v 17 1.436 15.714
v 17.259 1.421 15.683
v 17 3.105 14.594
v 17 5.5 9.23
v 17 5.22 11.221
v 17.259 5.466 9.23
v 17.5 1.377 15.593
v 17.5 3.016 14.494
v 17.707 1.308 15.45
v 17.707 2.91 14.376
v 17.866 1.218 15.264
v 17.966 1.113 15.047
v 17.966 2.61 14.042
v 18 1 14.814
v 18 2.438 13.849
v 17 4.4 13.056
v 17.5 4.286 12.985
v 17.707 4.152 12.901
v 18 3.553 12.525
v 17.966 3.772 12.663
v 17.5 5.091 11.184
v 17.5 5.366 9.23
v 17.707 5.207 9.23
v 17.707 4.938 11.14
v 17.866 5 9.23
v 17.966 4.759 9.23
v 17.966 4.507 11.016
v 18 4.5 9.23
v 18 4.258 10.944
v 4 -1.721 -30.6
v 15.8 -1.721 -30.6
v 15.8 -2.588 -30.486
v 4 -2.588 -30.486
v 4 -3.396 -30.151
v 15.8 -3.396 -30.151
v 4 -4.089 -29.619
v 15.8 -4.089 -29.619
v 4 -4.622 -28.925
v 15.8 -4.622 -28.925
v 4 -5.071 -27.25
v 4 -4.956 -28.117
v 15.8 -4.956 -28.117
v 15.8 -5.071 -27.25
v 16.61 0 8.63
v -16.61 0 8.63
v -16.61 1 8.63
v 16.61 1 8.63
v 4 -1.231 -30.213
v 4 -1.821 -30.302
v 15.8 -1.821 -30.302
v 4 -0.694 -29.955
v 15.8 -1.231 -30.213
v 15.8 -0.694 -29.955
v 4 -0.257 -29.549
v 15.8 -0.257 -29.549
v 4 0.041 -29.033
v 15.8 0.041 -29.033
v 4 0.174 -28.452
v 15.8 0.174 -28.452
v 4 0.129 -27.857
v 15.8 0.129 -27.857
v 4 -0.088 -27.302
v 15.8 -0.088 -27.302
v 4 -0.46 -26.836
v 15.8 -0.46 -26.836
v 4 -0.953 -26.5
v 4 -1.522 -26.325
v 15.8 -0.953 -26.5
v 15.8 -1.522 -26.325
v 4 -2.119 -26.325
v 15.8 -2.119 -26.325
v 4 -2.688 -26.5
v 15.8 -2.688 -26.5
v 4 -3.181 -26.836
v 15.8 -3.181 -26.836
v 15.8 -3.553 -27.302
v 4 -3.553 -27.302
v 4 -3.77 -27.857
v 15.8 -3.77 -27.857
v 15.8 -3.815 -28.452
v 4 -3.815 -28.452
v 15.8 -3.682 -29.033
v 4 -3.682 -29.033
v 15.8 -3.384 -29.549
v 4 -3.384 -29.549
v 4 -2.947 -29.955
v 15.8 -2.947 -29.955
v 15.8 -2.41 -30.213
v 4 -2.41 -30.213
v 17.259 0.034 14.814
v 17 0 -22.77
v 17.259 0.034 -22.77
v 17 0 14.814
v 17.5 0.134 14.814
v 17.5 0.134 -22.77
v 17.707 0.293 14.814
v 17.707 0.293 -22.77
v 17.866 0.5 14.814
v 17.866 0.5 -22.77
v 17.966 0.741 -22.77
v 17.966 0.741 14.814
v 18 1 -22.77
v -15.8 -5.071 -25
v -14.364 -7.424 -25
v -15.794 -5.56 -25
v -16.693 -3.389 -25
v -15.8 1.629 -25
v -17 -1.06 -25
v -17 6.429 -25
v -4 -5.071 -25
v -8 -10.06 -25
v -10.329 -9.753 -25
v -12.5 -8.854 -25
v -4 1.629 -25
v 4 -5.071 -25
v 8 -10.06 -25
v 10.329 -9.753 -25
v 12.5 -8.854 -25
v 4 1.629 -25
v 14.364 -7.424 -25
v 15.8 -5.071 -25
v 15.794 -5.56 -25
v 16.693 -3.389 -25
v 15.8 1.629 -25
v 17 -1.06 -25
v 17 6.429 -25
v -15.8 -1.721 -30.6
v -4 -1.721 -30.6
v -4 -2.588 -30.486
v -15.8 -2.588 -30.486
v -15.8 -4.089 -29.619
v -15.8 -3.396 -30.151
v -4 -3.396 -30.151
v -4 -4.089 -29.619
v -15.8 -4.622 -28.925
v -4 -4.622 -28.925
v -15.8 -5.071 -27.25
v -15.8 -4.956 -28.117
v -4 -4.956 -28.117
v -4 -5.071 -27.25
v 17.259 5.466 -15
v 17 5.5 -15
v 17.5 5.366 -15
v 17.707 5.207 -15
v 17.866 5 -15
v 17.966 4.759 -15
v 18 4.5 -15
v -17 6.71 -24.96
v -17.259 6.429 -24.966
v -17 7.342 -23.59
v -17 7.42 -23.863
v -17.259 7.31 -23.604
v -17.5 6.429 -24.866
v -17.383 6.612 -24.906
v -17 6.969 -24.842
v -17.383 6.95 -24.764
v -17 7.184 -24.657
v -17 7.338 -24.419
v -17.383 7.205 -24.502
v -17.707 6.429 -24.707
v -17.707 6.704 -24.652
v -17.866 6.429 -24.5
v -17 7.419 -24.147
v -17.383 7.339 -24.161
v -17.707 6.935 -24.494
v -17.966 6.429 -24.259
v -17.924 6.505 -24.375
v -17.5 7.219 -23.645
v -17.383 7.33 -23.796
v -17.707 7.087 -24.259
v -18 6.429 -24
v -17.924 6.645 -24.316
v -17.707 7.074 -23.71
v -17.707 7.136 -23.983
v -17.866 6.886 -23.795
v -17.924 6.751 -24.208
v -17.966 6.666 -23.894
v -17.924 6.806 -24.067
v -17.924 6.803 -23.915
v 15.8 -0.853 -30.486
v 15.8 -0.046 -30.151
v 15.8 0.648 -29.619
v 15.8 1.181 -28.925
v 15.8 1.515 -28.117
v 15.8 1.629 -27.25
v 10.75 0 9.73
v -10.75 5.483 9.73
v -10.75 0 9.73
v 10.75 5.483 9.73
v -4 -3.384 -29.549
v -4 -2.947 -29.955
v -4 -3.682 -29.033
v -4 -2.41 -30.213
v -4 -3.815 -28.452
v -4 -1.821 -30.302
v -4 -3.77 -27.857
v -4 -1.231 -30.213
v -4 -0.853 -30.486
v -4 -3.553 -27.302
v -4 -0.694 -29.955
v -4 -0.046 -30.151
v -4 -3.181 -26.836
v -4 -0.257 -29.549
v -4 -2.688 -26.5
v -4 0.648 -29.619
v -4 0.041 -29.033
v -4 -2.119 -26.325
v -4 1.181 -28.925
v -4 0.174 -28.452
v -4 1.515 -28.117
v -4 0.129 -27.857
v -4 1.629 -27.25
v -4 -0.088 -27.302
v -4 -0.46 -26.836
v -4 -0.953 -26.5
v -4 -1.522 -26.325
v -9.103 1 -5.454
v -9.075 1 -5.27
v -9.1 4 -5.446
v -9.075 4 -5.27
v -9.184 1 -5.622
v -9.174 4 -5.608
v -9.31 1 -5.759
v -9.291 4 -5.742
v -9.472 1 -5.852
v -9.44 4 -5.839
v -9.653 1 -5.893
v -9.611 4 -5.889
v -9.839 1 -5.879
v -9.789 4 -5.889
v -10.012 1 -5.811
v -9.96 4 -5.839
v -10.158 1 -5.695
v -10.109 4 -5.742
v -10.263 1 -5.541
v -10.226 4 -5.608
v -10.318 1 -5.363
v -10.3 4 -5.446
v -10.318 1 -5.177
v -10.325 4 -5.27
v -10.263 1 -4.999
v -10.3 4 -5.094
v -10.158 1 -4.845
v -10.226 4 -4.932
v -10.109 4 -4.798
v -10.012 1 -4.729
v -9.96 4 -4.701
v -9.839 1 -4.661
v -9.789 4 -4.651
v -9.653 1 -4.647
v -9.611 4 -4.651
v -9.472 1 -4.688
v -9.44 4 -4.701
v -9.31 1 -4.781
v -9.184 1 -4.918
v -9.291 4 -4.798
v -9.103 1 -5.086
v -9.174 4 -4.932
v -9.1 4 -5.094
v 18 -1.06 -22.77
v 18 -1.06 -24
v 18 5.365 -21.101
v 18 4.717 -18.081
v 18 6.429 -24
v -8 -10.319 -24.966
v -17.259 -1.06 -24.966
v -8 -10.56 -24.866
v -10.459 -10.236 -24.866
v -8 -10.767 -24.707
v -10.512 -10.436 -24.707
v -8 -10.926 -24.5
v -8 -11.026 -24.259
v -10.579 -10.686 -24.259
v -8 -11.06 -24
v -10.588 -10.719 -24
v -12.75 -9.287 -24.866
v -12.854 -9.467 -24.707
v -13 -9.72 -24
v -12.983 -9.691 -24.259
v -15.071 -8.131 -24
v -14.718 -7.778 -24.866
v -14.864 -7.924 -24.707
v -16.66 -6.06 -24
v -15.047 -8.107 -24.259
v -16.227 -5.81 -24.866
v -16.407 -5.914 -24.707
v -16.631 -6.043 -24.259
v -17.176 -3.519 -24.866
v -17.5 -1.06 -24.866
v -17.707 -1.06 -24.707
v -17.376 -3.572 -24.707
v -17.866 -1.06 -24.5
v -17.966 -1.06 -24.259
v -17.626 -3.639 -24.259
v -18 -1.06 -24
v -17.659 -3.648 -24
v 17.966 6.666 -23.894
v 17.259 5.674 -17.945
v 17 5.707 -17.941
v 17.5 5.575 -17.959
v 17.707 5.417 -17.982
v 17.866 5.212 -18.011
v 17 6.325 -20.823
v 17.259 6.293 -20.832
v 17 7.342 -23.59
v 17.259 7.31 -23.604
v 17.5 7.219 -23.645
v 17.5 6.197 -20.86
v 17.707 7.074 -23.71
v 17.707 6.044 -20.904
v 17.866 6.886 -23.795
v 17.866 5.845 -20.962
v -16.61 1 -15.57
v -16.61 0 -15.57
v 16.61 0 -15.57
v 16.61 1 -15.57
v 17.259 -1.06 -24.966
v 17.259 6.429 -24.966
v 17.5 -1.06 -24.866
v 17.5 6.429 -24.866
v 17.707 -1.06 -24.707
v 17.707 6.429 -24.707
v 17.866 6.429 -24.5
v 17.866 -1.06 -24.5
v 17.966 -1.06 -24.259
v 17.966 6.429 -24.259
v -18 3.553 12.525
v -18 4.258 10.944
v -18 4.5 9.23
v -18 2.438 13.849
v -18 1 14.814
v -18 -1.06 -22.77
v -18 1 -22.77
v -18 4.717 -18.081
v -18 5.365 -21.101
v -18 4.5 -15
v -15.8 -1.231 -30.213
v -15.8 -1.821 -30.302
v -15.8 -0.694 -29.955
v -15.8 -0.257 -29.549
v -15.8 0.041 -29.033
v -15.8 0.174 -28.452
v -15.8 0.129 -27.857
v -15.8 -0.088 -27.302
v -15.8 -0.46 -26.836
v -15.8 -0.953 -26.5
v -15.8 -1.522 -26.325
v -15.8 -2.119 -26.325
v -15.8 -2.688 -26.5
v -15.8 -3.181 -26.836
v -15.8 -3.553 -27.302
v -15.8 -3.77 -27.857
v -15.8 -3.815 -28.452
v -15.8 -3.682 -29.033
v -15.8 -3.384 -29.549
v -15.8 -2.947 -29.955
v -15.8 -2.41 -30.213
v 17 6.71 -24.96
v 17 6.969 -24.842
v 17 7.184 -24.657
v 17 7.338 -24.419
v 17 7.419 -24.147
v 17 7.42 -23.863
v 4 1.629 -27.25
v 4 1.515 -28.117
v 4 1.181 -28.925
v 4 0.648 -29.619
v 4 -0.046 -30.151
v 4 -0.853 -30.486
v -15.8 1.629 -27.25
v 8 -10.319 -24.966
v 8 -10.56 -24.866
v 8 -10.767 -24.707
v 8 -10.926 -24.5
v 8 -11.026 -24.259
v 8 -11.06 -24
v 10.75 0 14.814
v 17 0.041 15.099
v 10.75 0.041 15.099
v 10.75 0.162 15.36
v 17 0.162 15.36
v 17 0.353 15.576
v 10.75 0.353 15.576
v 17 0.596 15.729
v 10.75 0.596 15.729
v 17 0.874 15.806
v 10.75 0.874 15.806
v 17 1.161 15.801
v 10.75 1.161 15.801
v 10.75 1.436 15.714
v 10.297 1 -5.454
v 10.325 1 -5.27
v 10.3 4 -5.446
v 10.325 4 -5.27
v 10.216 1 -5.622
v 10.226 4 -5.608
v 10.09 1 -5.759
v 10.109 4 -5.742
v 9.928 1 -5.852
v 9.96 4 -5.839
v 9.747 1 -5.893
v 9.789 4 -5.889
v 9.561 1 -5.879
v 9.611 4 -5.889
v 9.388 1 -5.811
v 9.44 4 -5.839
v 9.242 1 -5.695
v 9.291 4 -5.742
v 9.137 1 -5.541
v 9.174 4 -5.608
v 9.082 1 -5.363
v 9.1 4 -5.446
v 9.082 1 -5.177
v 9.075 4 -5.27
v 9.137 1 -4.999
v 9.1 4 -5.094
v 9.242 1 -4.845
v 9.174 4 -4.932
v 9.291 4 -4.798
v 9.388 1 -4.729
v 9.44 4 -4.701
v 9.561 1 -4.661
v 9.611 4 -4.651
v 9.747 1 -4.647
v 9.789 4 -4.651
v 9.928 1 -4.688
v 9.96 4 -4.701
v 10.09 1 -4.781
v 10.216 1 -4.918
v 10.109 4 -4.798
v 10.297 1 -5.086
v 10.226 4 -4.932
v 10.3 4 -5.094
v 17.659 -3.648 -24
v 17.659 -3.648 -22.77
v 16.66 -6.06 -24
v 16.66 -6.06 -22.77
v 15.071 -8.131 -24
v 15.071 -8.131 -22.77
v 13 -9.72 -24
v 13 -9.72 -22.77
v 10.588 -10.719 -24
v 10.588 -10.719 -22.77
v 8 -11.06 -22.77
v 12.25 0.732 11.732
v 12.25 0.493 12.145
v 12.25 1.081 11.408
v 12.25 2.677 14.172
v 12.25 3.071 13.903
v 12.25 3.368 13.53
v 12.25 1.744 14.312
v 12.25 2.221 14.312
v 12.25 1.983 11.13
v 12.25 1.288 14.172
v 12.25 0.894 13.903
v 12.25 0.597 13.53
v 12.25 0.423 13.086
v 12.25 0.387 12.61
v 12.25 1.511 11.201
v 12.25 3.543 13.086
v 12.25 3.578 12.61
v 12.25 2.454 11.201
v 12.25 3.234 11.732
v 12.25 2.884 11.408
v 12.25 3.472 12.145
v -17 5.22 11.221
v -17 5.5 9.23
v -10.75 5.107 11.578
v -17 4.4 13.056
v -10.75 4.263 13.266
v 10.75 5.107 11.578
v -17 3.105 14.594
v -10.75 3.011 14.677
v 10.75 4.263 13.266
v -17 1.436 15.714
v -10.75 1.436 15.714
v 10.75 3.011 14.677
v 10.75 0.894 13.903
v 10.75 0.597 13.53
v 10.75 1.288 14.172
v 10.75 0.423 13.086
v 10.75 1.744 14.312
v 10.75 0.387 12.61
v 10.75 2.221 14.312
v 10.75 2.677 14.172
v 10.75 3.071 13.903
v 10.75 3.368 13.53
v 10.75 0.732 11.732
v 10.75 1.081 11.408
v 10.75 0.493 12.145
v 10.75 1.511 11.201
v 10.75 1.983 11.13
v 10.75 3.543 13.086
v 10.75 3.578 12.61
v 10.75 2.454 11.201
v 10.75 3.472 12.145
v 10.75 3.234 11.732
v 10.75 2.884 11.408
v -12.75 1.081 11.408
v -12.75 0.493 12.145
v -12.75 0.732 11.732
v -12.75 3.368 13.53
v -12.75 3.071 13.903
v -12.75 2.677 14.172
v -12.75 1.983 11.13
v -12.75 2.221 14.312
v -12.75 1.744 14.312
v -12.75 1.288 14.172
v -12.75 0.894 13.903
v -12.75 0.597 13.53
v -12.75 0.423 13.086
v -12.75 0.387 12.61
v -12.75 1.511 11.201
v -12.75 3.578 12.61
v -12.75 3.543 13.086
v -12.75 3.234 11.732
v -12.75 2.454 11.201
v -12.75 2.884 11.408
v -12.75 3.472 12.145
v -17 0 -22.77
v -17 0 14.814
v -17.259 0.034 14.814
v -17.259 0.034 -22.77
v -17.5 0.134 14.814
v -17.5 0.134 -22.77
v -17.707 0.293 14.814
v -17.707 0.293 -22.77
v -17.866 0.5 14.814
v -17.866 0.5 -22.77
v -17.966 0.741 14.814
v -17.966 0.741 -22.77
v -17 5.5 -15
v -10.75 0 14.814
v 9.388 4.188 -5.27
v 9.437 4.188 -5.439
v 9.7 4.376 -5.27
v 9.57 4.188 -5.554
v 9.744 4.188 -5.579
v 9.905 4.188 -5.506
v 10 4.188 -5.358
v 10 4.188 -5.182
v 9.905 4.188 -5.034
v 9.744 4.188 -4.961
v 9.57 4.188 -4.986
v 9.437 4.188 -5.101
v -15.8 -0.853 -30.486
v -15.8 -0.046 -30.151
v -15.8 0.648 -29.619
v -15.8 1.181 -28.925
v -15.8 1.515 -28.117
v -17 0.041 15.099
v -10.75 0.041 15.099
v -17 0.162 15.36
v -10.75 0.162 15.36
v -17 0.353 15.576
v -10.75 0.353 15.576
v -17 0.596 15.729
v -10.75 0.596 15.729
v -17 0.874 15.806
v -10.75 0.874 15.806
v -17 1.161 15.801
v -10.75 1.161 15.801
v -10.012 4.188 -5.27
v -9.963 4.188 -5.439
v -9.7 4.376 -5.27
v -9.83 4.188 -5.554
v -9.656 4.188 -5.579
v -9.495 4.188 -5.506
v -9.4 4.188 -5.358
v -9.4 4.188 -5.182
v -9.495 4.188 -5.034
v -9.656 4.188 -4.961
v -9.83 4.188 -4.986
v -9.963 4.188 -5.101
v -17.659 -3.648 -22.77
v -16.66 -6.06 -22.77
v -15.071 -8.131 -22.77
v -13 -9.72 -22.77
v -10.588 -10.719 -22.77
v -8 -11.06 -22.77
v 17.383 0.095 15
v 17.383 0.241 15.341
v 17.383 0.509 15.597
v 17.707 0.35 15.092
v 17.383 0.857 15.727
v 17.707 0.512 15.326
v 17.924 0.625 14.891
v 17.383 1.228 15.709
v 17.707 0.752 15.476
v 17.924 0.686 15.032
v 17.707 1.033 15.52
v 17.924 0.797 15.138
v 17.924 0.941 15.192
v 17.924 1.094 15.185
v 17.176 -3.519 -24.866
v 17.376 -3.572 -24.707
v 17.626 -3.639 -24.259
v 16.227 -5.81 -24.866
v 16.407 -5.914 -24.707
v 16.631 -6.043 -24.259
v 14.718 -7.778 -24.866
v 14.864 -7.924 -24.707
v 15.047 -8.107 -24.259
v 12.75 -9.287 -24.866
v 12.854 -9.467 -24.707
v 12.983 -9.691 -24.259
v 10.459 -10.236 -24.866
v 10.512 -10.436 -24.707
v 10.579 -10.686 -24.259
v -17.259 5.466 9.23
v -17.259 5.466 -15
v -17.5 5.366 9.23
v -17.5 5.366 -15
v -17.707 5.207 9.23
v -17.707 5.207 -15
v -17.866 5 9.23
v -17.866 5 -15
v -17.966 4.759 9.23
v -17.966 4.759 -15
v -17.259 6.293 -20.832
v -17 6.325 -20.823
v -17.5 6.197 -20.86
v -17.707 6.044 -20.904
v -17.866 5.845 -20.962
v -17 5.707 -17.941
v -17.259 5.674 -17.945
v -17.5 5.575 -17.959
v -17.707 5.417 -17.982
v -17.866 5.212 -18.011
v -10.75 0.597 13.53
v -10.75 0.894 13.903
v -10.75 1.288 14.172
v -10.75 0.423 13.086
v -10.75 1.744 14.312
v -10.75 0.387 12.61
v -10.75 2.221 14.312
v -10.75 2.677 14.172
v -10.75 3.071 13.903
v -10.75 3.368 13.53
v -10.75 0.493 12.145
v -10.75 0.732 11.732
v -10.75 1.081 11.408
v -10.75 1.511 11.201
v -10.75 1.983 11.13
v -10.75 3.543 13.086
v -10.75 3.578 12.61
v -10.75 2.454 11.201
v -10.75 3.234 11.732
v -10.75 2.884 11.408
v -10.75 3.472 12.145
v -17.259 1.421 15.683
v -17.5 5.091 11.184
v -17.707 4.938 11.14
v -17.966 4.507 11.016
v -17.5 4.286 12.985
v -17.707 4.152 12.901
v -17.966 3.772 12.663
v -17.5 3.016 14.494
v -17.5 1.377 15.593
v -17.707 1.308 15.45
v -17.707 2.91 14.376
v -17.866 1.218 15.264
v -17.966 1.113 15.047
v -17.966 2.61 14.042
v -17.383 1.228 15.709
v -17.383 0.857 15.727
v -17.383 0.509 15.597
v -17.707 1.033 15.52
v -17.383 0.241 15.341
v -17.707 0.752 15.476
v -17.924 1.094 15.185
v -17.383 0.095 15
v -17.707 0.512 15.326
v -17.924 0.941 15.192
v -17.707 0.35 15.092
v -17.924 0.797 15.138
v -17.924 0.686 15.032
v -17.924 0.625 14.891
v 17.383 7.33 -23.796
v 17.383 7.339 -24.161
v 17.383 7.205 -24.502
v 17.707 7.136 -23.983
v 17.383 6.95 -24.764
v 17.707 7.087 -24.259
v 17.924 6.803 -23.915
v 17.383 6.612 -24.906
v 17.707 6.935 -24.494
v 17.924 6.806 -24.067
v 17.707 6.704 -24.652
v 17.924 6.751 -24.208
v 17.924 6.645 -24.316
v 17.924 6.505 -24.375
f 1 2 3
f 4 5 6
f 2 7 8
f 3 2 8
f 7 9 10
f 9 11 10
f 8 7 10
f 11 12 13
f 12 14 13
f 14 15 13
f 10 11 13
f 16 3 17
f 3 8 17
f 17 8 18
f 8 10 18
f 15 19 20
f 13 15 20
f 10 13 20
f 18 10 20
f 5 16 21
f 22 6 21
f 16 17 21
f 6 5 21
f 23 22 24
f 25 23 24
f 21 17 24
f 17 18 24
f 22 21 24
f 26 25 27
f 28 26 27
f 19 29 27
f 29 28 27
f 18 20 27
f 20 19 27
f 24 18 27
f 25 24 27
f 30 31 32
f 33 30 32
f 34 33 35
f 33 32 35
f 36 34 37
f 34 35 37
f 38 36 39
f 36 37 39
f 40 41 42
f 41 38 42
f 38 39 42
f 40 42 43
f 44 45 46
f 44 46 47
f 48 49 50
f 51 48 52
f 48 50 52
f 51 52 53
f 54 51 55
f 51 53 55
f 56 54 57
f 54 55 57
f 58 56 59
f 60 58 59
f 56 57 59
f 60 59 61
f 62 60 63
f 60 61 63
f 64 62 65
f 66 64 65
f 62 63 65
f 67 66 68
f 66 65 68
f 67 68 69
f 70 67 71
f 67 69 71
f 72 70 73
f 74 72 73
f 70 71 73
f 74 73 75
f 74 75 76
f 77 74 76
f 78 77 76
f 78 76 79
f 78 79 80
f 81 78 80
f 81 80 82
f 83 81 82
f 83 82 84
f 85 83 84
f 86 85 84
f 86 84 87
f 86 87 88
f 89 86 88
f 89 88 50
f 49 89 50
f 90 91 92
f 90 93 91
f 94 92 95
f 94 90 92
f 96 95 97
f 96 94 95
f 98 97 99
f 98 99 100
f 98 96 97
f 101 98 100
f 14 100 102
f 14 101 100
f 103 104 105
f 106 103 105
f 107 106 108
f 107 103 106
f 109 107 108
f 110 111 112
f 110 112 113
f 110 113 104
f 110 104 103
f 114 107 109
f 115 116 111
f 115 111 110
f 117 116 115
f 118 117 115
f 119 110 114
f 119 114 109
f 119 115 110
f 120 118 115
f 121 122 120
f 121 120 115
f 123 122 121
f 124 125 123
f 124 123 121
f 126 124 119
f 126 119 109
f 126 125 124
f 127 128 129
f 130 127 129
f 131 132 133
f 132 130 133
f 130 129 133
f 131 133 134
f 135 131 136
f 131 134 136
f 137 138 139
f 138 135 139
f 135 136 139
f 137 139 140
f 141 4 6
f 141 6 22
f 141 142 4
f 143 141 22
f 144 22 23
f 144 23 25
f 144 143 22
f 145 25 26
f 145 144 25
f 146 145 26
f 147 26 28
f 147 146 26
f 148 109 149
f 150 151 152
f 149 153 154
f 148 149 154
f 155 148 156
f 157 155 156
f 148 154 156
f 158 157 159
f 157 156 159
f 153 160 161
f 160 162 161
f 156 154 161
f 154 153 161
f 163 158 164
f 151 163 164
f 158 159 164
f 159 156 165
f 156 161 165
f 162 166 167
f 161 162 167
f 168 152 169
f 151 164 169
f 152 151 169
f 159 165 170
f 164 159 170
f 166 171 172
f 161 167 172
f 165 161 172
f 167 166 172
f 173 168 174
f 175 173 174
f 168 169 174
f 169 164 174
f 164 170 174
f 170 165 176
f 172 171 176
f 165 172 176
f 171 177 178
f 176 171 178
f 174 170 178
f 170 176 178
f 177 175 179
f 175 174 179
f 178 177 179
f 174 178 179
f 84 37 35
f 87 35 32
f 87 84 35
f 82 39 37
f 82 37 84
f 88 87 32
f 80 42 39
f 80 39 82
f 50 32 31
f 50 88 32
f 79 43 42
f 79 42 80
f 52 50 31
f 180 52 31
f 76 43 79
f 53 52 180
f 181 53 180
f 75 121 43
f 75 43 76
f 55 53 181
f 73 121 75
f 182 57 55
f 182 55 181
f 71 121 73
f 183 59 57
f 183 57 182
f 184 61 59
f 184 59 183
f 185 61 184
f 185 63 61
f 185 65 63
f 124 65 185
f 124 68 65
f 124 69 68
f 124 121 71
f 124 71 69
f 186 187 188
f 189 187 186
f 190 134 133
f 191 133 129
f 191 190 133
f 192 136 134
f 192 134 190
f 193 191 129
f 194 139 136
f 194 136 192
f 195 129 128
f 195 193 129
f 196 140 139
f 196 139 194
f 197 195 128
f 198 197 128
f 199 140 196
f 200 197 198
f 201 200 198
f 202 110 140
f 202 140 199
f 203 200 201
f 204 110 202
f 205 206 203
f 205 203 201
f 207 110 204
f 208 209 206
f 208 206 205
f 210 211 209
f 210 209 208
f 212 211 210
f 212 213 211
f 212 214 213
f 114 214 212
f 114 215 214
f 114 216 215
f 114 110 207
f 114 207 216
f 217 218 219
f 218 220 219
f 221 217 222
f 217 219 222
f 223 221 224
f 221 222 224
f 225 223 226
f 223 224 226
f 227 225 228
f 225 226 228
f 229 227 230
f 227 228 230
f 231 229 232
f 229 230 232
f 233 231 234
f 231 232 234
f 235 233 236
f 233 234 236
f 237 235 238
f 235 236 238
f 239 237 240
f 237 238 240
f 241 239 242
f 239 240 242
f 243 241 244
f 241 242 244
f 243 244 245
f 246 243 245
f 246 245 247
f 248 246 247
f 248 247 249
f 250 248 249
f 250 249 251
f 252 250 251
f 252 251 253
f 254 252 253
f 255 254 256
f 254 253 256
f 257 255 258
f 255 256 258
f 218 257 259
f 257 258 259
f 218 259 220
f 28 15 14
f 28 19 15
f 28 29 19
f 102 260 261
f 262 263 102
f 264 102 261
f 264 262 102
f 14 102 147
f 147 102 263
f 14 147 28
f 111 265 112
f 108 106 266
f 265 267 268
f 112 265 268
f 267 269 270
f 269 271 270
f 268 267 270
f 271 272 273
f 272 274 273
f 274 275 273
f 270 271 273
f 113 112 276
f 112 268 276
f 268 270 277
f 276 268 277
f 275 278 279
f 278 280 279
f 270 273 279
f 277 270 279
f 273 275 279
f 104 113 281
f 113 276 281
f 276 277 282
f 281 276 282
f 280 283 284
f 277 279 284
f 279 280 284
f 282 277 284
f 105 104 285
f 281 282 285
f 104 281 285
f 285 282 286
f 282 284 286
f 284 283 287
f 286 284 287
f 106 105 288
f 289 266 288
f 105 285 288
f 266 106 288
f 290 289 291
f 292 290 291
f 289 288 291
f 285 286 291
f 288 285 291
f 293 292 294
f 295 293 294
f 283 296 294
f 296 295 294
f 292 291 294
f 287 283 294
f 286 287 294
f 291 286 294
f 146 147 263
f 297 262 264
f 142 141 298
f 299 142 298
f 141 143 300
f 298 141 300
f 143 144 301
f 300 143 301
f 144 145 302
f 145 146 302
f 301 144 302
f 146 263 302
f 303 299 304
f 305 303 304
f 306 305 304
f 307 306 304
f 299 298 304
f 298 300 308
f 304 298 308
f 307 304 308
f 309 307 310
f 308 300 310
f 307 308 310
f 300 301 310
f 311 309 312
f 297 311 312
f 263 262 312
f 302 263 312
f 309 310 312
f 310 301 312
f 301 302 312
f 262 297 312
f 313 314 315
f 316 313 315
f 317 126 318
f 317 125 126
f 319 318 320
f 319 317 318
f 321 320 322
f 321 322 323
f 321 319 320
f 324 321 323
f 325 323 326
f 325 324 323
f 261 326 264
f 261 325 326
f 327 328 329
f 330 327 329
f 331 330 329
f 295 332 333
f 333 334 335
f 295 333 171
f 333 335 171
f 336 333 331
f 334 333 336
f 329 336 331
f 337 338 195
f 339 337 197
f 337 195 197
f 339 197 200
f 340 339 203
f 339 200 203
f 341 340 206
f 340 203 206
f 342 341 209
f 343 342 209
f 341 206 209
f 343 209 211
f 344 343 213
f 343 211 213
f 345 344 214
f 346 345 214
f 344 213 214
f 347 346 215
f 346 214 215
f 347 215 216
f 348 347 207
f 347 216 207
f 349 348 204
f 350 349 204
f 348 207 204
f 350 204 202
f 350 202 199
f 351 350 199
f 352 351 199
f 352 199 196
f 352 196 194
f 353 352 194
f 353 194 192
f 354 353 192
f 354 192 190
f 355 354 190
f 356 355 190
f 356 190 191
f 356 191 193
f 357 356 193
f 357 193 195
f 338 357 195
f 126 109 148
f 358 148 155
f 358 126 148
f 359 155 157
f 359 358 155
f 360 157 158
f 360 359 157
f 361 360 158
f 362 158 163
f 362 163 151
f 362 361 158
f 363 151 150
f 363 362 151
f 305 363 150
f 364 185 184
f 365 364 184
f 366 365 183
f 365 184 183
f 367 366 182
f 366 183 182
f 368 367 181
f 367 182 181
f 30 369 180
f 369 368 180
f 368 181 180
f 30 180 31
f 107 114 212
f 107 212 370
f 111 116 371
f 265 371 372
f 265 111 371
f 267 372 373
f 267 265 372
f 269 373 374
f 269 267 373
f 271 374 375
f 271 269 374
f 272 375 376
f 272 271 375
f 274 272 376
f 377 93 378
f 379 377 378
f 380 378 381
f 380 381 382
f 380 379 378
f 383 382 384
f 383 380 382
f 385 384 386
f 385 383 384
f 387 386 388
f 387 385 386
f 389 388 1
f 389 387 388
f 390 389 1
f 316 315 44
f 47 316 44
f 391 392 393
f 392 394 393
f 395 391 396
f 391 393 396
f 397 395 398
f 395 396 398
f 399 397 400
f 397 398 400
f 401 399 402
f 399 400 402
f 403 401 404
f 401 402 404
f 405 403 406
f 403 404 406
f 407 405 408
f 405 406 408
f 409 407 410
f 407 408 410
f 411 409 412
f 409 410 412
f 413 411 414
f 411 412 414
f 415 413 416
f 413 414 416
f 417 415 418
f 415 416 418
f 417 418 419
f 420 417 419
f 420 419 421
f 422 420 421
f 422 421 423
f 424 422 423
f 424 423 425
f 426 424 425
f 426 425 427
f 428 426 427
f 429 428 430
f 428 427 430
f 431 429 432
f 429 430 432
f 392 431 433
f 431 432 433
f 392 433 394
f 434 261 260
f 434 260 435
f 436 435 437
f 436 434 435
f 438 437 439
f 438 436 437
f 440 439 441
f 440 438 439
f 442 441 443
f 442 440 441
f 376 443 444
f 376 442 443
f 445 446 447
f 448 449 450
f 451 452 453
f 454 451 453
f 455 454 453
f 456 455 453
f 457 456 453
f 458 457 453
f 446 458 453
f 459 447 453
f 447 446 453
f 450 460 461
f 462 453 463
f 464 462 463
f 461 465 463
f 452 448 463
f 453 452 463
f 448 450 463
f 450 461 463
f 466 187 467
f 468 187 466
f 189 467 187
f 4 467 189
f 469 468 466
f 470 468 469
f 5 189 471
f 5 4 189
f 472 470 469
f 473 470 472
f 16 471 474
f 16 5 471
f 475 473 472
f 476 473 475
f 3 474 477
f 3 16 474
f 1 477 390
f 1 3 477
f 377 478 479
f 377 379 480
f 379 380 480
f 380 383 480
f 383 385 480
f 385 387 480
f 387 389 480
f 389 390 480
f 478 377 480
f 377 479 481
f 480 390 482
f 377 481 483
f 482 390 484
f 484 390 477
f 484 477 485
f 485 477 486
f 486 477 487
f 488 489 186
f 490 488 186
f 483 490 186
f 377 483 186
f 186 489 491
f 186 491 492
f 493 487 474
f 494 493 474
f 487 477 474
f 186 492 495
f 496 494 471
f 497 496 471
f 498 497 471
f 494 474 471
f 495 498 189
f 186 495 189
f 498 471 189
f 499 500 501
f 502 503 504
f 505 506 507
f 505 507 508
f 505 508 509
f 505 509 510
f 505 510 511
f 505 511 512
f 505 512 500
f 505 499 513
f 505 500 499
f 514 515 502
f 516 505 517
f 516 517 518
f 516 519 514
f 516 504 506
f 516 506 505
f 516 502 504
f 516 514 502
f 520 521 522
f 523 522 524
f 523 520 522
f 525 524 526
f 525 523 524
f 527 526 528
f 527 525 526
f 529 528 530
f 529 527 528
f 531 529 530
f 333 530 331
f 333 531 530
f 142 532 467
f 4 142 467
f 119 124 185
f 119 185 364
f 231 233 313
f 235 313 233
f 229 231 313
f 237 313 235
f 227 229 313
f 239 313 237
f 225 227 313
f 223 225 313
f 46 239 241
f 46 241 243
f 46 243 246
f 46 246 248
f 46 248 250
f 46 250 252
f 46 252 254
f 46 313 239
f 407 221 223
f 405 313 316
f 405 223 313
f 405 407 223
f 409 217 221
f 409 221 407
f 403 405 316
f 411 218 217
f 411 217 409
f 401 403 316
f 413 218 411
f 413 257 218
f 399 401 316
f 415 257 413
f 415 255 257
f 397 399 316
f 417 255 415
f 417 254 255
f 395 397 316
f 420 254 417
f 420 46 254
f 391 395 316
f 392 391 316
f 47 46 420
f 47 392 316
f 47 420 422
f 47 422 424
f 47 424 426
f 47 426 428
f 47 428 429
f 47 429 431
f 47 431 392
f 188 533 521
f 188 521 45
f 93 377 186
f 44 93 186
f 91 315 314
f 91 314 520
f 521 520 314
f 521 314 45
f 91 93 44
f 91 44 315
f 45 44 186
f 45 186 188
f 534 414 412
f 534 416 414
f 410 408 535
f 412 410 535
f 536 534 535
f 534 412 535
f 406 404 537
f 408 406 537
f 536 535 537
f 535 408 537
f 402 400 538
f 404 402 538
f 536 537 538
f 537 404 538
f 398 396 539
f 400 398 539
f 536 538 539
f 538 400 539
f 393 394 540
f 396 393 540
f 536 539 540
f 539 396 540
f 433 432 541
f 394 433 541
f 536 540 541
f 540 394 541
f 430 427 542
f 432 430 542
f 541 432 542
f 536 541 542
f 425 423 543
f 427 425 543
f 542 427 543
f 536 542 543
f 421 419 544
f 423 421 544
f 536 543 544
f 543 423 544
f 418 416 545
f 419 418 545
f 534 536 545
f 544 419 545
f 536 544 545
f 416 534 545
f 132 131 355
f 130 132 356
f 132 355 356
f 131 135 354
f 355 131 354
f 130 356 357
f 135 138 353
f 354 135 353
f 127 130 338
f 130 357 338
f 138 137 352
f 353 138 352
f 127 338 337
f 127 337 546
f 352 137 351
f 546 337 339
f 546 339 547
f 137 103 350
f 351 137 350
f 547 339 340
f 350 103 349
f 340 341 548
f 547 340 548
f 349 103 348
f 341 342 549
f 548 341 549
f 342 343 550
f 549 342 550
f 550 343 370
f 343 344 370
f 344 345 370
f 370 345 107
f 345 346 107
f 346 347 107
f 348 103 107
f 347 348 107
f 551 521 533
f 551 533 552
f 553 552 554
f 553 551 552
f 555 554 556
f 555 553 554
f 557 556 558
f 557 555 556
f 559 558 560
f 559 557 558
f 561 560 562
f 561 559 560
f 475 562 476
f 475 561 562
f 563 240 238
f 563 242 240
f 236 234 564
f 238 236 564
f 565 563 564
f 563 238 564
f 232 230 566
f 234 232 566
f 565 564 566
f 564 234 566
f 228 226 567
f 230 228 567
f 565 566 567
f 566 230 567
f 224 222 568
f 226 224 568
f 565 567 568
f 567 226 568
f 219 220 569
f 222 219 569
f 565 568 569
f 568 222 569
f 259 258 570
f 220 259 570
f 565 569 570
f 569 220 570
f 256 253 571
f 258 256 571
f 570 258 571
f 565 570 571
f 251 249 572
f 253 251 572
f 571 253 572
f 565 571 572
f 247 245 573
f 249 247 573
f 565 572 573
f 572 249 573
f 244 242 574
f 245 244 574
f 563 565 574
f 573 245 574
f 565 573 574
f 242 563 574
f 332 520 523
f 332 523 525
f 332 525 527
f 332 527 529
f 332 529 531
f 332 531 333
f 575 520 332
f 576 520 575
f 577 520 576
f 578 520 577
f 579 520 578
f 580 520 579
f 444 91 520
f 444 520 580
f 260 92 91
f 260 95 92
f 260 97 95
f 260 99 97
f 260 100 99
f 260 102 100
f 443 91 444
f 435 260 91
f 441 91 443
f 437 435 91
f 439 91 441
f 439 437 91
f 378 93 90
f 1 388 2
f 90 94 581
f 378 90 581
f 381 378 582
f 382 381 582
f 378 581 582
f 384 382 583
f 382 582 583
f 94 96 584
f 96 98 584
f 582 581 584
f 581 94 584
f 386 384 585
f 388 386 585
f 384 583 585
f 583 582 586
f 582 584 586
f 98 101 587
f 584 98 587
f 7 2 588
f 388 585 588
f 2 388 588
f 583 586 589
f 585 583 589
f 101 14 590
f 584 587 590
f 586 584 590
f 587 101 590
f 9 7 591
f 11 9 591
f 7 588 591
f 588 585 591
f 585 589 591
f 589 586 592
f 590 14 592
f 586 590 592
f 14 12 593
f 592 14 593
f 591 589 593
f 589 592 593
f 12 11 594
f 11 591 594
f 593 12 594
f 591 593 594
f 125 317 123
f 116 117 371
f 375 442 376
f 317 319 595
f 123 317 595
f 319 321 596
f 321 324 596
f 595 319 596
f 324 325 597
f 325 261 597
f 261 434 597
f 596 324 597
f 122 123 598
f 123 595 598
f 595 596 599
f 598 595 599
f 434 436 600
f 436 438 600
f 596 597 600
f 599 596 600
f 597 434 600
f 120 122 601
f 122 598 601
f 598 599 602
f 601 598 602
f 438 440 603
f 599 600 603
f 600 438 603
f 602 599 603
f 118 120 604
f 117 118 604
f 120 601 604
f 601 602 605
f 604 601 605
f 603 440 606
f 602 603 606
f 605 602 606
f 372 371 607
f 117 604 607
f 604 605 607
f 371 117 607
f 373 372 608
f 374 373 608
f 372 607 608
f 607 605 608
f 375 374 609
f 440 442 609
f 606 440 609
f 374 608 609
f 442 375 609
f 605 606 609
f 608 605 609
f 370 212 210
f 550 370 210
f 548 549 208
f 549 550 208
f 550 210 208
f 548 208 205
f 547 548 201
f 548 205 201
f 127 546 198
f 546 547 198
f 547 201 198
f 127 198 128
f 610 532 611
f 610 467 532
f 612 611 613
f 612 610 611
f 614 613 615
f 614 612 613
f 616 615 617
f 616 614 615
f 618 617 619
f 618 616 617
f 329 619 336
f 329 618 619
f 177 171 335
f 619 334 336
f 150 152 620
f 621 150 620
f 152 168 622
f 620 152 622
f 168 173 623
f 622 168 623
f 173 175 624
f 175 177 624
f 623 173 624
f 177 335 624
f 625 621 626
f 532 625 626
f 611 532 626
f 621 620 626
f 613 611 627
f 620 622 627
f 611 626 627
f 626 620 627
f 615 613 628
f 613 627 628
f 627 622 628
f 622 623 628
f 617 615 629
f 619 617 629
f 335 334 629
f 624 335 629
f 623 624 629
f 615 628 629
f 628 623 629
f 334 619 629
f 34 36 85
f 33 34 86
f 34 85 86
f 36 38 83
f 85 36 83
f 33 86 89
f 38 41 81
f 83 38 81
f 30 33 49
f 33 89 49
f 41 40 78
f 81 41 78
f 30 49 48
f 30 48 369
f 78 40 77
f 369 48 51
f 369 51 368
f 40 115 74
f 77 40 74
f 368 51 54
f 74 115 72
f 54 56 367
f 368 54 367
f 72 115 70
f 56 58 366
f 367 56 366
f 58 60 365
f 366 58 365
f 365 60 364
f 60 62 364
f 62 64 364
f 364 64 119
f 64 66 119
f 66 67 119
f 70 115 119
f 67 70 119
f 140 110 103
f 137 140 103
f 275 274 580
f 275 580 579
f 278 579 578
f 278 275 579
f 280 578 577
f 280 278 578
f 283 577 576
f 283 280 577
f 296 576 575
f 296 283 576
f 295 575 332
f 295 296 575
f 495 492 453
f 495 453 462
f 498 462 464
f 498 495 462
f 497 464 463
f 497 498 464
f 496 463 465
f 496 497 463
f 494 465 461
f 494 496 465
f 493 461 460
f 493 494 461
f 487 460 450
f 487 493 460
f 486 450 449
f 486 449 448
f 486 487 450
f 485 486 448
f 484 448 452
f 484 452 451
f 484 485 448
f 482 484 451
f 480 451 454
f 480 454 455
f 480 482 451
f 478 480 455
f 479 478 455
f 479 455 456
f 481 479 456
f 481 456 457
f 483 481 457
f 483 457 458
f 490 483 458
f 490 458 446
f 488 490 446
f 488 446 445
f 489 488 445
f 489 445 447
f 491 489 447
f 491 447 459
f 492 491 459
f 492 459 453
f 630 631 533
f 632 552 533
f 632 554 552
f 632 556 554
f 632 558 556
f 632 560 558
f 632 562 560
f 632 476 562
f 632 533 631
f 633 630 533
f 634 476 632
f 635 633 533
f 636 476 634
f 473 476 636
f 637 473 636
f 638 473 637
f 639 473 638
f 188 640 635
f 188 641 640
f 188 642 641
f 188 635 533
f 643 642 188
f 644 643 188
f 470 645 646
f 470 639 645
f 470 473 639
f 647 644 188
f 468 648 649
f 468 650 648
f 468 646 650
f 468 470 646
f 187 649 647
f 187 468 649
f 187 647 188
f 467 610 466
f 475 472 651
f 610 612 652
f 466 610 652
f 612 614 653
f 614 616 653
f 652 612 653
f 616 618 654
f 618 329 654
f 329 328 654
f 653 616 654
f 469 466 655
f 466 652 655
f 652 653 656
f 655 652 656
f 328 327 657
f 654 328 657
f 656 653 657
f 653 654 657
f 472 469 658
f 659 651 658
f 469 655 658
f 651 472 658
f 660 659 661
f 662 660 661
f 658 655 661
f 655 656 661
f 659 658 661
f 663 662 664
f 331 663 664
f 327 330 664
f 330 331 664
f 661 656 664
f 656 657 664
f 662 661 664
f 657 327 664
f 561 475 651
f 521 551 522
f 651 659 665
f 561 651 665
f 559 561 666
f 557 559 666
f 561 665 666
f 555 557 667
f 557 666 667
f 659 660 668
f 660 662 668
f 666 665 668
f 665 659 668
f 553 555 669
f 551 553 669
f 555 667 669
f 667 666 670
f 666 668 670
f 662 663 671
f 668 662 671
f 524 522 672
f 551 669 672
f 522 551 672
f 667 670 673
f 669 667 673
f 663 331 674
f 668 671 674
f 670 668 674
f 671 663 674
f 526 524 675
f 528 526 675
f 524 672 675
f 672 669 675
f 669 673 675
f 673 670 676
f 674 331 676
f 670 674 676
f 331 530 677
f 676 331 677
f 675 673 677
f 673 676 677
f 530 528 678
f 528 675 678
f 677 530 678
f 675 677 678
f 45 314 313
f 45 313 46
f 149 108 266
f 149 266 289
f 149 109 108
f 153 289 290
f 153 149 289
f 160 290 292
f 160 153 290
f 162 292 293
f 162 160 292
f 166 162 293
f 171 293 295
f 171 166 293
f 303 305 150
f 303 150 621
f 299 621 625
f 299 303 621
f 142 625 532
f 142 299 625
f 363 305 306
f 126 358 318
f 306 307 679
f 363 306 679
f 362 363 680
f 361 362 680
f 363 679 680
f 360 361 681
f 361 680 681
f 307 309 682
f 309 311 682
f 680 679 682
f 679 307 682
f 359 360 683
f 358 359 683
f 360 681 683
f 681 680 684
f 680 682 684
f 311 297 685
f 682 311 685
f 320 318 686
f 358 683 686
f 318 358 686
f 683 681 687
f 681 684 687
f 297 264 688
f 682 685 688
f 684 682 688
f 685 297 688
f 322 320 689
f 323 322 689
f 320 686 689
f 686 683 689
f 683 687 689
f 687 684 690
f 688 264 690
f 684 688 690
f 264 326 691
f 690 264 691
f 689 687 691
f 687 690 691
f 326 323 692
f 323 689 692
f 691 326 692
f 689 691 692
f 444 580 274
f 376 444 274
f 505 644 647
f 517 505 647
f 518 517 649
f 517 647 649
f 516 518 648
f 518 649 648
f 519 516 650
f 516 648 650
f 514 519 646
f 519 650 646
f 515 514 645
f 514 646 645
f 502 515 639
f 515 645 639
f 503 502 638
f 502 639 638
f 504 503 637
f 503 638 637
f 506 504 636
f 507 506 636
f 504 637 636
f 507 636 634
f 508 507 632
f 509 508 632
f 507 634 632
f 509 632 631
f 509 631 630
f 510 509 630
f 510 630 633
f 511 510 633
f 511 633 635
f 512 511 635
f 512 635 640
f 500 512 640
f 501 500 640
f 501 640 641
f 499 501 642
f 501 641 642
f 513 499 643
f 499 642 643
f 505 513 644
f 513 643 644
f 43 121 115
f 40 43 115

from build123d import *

# Parameters (mm, degrees)
BOSS_EXTRUDE1_DEPTH     = 18
SKETCH2_W               = 21.5
SKETCH2_H               = 6.5
CUT_EXTRUDE1_DEPTH      = 36
FILLET1_R               = 1
FILLET2_R               = 10
SKETCH3_R               = 1.6
CUT_EXTRUDE2_DEPTH      = 23
CUT_EXTRUDE2_DEPTH_BACK = 2
SKETCH4_W               = 11.8
SKETCH4_H               = 6.7
BOSS_EXTRUDE2_DEPTH     = 5.6
CUT_EXTRUDE3_DEPTH      = 34.8
SKETCH6_R               = 2
CUT_EXTRUDE4_DEPTH      = 34.8
SKETCH7_W               = 33.22
SKETCH7_H               = 24.2
CUT_EXTRUDE5_DEPTH      = 1
M1_6_TAPPED_HOLE1_D     = 1.25
M1_6_TAPPED_HOLE1_DEPTH = 3
M1_6_TAPPED_HOLE1_TIP   = 0.375537887
FILLET3_R               = 1
FILLET4_R               = 1


with BuildPart() as part:
    # Sketch1 → Boss-Extrude1 (new body, symmetric)
    with BuildSketch(Plane(origin=(0, 0, 0), x_dir=(0, 0, -1), z_dir=(1, 0, 0))):
        with BuildLine():
            Line((-16.23, 0), (22.77, 0))
            Line((22.77, 0), (22.77, -11.06))
            Line((22.77, -11.06), (25, -11.06))
            Line((25, -11.06), (25, 8.04))
            ThreePointArc((25, 8.04), (20.158769233, 6.144924279), (15, 5.5))
            Line((15, 5.5), (-9.23, 5.5))
            ThreePointArc((-9.23, 5.5), (-13.681123454, 3.960520759), (-16.23, 0))
        make_face()
    extrude(amount=BOSS_EXTRUDE1_DEPTH, both=True)

    # Sketch2 → Cut-Extrude1 (cut)
    with BuildSketch(Plane(origin=(0, 5.5, 0), x_dir=(1, 0, 0), z_dir=(0, 1, 0))):
        with Locations((0, -12.98)):
            Rectangle(SKETCH2_W, SKETCH2_H)
    extrude(amount=-CUT_EXTRUDE1_DEPTH, mode=Mode.SUBTRACT)

    # Fillet1
    fillet1_edges = [part.edges().sort_by_distance(p)[0] for p in [
        (0, 8.04, -25),
    ]]
    fillet(fillet1_edges, radius=FILLET1_R)

    # Fillet2
    fillet2_edges = [part.edges().sort_by_distance(p)[0] for p in [
        (18, -11.06, -23.885),
        (-18, -11.06, -23.885),
    ]]
    fillet(fillet2_edges, radius=FILLET2_R)

    # Sketch3 → Cut-Extrude2 (cut, two sides)
    with BuildSketch(Plane(origin=(-10.75, 0, 0), x_dir=(0, 0, -1), z_dir=(1, 0, 0))) as cut_extrude2_sk:
        with Locations((-12.73, 1.9826289)):
            Circle(SKETCH3_R)
    extrude(amount=CUT_EXTRUDE2_DEPTH, mode=Mode.SUBTRACT)
    extrude(cut_extrude2_sk.sketch, amount=-CUT_EXTRUDE2_DEPTH_BACK, mode=Mode.SUBTRACT)

    # Sketch4 → Boss-Extrude2 (add)
    with BuildSketch(Plane(origin=(0, 0, -25), x_dir=(-1, 0, 0), z_dir=(0, 0, -1))):
        with Locations((-9.9, -1.720538118)):
            Rectangle(SKETCH4_W, SKETCH4_H)
        with Locations((9.9, -1.720538118)):
            Rectangle(SKETCH4_W, SKETCH4_H)
    extrude(amount=BOSS_EXTRUDE2_DEPTH)

    # Sketch5 → Cut-Extrude3 (cut, through all)
    with BuildSketch(Plane(origin=(15.8, 0, 0), x_dir=(0, 0, -1), z_dir=(1, 0, 0))):
        with BuildLine():
            Line((30.6, -1.720538118), (30.6, 1.629461882))
            Line((30.6, 1.629461882), (27.25, 1.629461882))
            ThreePointArc((27.25, 1.629461882), (29.618807717, 0.648269599), (30.6, -1.720538118))
        make_face()
        with BuildLine():
            Line((30.6, -5.070538118), (30.6, -1.720538118))
            ThreePointArc((30.6, -1.720538118), (29.618807717, -4.089345835), (27.25, -5.070538118))
            Line((27.25, -5.070538118), (30.6, -5.070538118))
        make_face()
    extrude(amount=-CUT_EXTRUDE3_DEPTH, mode=Mode.SUBTRACT)

    # Sketch6 → Cut-Extrude4 (cut, through all)
    with BuildSketch(Plane(origin=(15.8, 0, 0), x_dir=(0, 0, -1), z_dir=(1, 0, 0))):
        with Locations((28.302174941, -1.820538118)):
            Circle(SKETCH6_R)
    extrude(amount=-CUT_EXTRUDE4_DEPTH, mode=Mode.SUBTRACT)

    # Sketch7 → Cut-Extrude5 (cut)
    with BuildSketch(Plane.XZ):
        with Locations((0, -3.47)):
            Rectangle(SKETCH7_W, SKETCH7_H)
    extrude(amount=-CUT_EXTRUDE5_DEPTH, mode=Mode.SUBTRACT)

    # M1.6 Tapped Hole1
    with Locations(Plane(origin=(0, 1, 0), x_dir=(-1, 0, 0), z_dir=(0, -1, 0))):
        with Locations((9.7, 5.27), (-9.7, 5.27)):
            Hole(M1_6_TAPPED_HOLE1_D / 2, depth=M1_6_TAPPED_HOLE1_DEPTH)
            with Locations((0, 0, -(M1_6_TAPPED_HOLE1_DEPTH + M1_6_TAPPED_HOLE1_TIP / 2))):  # 118° drill point
                Cone(0, M1_6_TAPPED_HOLE1_D / 2, M1_6_TAPPED_HOLE1_TIP, mode=Mode.SUBTRACT)

    # Fillet3
    fillet3_edges = [part.edges().sort_by_distance(p)[0] for p in [
        (14.375, 0, 16.23),
        (-14.375, 0, 16.23),
    ]]
    fillet(fillet3_edges, radius=FILLET3_R)

    # Fillet4
    fillet4_edges = [part.edges().sort_by_distance(p)[0] for p in [
        (-18, 0, -3.977965877),
        (18, 0, -3.977965877),
        (-18, 0.468914995, 15.661386792),
        (18, 0.468914995, 15.661386792),
        (18, 5.5, -2.885),
        (18, 4.399999523, 13.056226055),
        (-18, 5.96556671, -19.392628497),
        (18, 5.96556671, -19.392628497),
        (-18, 7.269083423, -24.543171858),
        (18, 7.269083423, -24.543171858),
        (0, -11.06, -25),
        (-18, 2.684730941, -25),
        (18, 2.684730941, -25),
        (15.071067812, -8.131067812, -25),
        (-15.071067812, -8.131067812, -25),
        (-18, 5.5, -2.885),
        (-18, 4.399999523, 13.056226055),
    ]]
    fillet(fillet4_edges, radius=FILLET4_R)


solid = part.part
